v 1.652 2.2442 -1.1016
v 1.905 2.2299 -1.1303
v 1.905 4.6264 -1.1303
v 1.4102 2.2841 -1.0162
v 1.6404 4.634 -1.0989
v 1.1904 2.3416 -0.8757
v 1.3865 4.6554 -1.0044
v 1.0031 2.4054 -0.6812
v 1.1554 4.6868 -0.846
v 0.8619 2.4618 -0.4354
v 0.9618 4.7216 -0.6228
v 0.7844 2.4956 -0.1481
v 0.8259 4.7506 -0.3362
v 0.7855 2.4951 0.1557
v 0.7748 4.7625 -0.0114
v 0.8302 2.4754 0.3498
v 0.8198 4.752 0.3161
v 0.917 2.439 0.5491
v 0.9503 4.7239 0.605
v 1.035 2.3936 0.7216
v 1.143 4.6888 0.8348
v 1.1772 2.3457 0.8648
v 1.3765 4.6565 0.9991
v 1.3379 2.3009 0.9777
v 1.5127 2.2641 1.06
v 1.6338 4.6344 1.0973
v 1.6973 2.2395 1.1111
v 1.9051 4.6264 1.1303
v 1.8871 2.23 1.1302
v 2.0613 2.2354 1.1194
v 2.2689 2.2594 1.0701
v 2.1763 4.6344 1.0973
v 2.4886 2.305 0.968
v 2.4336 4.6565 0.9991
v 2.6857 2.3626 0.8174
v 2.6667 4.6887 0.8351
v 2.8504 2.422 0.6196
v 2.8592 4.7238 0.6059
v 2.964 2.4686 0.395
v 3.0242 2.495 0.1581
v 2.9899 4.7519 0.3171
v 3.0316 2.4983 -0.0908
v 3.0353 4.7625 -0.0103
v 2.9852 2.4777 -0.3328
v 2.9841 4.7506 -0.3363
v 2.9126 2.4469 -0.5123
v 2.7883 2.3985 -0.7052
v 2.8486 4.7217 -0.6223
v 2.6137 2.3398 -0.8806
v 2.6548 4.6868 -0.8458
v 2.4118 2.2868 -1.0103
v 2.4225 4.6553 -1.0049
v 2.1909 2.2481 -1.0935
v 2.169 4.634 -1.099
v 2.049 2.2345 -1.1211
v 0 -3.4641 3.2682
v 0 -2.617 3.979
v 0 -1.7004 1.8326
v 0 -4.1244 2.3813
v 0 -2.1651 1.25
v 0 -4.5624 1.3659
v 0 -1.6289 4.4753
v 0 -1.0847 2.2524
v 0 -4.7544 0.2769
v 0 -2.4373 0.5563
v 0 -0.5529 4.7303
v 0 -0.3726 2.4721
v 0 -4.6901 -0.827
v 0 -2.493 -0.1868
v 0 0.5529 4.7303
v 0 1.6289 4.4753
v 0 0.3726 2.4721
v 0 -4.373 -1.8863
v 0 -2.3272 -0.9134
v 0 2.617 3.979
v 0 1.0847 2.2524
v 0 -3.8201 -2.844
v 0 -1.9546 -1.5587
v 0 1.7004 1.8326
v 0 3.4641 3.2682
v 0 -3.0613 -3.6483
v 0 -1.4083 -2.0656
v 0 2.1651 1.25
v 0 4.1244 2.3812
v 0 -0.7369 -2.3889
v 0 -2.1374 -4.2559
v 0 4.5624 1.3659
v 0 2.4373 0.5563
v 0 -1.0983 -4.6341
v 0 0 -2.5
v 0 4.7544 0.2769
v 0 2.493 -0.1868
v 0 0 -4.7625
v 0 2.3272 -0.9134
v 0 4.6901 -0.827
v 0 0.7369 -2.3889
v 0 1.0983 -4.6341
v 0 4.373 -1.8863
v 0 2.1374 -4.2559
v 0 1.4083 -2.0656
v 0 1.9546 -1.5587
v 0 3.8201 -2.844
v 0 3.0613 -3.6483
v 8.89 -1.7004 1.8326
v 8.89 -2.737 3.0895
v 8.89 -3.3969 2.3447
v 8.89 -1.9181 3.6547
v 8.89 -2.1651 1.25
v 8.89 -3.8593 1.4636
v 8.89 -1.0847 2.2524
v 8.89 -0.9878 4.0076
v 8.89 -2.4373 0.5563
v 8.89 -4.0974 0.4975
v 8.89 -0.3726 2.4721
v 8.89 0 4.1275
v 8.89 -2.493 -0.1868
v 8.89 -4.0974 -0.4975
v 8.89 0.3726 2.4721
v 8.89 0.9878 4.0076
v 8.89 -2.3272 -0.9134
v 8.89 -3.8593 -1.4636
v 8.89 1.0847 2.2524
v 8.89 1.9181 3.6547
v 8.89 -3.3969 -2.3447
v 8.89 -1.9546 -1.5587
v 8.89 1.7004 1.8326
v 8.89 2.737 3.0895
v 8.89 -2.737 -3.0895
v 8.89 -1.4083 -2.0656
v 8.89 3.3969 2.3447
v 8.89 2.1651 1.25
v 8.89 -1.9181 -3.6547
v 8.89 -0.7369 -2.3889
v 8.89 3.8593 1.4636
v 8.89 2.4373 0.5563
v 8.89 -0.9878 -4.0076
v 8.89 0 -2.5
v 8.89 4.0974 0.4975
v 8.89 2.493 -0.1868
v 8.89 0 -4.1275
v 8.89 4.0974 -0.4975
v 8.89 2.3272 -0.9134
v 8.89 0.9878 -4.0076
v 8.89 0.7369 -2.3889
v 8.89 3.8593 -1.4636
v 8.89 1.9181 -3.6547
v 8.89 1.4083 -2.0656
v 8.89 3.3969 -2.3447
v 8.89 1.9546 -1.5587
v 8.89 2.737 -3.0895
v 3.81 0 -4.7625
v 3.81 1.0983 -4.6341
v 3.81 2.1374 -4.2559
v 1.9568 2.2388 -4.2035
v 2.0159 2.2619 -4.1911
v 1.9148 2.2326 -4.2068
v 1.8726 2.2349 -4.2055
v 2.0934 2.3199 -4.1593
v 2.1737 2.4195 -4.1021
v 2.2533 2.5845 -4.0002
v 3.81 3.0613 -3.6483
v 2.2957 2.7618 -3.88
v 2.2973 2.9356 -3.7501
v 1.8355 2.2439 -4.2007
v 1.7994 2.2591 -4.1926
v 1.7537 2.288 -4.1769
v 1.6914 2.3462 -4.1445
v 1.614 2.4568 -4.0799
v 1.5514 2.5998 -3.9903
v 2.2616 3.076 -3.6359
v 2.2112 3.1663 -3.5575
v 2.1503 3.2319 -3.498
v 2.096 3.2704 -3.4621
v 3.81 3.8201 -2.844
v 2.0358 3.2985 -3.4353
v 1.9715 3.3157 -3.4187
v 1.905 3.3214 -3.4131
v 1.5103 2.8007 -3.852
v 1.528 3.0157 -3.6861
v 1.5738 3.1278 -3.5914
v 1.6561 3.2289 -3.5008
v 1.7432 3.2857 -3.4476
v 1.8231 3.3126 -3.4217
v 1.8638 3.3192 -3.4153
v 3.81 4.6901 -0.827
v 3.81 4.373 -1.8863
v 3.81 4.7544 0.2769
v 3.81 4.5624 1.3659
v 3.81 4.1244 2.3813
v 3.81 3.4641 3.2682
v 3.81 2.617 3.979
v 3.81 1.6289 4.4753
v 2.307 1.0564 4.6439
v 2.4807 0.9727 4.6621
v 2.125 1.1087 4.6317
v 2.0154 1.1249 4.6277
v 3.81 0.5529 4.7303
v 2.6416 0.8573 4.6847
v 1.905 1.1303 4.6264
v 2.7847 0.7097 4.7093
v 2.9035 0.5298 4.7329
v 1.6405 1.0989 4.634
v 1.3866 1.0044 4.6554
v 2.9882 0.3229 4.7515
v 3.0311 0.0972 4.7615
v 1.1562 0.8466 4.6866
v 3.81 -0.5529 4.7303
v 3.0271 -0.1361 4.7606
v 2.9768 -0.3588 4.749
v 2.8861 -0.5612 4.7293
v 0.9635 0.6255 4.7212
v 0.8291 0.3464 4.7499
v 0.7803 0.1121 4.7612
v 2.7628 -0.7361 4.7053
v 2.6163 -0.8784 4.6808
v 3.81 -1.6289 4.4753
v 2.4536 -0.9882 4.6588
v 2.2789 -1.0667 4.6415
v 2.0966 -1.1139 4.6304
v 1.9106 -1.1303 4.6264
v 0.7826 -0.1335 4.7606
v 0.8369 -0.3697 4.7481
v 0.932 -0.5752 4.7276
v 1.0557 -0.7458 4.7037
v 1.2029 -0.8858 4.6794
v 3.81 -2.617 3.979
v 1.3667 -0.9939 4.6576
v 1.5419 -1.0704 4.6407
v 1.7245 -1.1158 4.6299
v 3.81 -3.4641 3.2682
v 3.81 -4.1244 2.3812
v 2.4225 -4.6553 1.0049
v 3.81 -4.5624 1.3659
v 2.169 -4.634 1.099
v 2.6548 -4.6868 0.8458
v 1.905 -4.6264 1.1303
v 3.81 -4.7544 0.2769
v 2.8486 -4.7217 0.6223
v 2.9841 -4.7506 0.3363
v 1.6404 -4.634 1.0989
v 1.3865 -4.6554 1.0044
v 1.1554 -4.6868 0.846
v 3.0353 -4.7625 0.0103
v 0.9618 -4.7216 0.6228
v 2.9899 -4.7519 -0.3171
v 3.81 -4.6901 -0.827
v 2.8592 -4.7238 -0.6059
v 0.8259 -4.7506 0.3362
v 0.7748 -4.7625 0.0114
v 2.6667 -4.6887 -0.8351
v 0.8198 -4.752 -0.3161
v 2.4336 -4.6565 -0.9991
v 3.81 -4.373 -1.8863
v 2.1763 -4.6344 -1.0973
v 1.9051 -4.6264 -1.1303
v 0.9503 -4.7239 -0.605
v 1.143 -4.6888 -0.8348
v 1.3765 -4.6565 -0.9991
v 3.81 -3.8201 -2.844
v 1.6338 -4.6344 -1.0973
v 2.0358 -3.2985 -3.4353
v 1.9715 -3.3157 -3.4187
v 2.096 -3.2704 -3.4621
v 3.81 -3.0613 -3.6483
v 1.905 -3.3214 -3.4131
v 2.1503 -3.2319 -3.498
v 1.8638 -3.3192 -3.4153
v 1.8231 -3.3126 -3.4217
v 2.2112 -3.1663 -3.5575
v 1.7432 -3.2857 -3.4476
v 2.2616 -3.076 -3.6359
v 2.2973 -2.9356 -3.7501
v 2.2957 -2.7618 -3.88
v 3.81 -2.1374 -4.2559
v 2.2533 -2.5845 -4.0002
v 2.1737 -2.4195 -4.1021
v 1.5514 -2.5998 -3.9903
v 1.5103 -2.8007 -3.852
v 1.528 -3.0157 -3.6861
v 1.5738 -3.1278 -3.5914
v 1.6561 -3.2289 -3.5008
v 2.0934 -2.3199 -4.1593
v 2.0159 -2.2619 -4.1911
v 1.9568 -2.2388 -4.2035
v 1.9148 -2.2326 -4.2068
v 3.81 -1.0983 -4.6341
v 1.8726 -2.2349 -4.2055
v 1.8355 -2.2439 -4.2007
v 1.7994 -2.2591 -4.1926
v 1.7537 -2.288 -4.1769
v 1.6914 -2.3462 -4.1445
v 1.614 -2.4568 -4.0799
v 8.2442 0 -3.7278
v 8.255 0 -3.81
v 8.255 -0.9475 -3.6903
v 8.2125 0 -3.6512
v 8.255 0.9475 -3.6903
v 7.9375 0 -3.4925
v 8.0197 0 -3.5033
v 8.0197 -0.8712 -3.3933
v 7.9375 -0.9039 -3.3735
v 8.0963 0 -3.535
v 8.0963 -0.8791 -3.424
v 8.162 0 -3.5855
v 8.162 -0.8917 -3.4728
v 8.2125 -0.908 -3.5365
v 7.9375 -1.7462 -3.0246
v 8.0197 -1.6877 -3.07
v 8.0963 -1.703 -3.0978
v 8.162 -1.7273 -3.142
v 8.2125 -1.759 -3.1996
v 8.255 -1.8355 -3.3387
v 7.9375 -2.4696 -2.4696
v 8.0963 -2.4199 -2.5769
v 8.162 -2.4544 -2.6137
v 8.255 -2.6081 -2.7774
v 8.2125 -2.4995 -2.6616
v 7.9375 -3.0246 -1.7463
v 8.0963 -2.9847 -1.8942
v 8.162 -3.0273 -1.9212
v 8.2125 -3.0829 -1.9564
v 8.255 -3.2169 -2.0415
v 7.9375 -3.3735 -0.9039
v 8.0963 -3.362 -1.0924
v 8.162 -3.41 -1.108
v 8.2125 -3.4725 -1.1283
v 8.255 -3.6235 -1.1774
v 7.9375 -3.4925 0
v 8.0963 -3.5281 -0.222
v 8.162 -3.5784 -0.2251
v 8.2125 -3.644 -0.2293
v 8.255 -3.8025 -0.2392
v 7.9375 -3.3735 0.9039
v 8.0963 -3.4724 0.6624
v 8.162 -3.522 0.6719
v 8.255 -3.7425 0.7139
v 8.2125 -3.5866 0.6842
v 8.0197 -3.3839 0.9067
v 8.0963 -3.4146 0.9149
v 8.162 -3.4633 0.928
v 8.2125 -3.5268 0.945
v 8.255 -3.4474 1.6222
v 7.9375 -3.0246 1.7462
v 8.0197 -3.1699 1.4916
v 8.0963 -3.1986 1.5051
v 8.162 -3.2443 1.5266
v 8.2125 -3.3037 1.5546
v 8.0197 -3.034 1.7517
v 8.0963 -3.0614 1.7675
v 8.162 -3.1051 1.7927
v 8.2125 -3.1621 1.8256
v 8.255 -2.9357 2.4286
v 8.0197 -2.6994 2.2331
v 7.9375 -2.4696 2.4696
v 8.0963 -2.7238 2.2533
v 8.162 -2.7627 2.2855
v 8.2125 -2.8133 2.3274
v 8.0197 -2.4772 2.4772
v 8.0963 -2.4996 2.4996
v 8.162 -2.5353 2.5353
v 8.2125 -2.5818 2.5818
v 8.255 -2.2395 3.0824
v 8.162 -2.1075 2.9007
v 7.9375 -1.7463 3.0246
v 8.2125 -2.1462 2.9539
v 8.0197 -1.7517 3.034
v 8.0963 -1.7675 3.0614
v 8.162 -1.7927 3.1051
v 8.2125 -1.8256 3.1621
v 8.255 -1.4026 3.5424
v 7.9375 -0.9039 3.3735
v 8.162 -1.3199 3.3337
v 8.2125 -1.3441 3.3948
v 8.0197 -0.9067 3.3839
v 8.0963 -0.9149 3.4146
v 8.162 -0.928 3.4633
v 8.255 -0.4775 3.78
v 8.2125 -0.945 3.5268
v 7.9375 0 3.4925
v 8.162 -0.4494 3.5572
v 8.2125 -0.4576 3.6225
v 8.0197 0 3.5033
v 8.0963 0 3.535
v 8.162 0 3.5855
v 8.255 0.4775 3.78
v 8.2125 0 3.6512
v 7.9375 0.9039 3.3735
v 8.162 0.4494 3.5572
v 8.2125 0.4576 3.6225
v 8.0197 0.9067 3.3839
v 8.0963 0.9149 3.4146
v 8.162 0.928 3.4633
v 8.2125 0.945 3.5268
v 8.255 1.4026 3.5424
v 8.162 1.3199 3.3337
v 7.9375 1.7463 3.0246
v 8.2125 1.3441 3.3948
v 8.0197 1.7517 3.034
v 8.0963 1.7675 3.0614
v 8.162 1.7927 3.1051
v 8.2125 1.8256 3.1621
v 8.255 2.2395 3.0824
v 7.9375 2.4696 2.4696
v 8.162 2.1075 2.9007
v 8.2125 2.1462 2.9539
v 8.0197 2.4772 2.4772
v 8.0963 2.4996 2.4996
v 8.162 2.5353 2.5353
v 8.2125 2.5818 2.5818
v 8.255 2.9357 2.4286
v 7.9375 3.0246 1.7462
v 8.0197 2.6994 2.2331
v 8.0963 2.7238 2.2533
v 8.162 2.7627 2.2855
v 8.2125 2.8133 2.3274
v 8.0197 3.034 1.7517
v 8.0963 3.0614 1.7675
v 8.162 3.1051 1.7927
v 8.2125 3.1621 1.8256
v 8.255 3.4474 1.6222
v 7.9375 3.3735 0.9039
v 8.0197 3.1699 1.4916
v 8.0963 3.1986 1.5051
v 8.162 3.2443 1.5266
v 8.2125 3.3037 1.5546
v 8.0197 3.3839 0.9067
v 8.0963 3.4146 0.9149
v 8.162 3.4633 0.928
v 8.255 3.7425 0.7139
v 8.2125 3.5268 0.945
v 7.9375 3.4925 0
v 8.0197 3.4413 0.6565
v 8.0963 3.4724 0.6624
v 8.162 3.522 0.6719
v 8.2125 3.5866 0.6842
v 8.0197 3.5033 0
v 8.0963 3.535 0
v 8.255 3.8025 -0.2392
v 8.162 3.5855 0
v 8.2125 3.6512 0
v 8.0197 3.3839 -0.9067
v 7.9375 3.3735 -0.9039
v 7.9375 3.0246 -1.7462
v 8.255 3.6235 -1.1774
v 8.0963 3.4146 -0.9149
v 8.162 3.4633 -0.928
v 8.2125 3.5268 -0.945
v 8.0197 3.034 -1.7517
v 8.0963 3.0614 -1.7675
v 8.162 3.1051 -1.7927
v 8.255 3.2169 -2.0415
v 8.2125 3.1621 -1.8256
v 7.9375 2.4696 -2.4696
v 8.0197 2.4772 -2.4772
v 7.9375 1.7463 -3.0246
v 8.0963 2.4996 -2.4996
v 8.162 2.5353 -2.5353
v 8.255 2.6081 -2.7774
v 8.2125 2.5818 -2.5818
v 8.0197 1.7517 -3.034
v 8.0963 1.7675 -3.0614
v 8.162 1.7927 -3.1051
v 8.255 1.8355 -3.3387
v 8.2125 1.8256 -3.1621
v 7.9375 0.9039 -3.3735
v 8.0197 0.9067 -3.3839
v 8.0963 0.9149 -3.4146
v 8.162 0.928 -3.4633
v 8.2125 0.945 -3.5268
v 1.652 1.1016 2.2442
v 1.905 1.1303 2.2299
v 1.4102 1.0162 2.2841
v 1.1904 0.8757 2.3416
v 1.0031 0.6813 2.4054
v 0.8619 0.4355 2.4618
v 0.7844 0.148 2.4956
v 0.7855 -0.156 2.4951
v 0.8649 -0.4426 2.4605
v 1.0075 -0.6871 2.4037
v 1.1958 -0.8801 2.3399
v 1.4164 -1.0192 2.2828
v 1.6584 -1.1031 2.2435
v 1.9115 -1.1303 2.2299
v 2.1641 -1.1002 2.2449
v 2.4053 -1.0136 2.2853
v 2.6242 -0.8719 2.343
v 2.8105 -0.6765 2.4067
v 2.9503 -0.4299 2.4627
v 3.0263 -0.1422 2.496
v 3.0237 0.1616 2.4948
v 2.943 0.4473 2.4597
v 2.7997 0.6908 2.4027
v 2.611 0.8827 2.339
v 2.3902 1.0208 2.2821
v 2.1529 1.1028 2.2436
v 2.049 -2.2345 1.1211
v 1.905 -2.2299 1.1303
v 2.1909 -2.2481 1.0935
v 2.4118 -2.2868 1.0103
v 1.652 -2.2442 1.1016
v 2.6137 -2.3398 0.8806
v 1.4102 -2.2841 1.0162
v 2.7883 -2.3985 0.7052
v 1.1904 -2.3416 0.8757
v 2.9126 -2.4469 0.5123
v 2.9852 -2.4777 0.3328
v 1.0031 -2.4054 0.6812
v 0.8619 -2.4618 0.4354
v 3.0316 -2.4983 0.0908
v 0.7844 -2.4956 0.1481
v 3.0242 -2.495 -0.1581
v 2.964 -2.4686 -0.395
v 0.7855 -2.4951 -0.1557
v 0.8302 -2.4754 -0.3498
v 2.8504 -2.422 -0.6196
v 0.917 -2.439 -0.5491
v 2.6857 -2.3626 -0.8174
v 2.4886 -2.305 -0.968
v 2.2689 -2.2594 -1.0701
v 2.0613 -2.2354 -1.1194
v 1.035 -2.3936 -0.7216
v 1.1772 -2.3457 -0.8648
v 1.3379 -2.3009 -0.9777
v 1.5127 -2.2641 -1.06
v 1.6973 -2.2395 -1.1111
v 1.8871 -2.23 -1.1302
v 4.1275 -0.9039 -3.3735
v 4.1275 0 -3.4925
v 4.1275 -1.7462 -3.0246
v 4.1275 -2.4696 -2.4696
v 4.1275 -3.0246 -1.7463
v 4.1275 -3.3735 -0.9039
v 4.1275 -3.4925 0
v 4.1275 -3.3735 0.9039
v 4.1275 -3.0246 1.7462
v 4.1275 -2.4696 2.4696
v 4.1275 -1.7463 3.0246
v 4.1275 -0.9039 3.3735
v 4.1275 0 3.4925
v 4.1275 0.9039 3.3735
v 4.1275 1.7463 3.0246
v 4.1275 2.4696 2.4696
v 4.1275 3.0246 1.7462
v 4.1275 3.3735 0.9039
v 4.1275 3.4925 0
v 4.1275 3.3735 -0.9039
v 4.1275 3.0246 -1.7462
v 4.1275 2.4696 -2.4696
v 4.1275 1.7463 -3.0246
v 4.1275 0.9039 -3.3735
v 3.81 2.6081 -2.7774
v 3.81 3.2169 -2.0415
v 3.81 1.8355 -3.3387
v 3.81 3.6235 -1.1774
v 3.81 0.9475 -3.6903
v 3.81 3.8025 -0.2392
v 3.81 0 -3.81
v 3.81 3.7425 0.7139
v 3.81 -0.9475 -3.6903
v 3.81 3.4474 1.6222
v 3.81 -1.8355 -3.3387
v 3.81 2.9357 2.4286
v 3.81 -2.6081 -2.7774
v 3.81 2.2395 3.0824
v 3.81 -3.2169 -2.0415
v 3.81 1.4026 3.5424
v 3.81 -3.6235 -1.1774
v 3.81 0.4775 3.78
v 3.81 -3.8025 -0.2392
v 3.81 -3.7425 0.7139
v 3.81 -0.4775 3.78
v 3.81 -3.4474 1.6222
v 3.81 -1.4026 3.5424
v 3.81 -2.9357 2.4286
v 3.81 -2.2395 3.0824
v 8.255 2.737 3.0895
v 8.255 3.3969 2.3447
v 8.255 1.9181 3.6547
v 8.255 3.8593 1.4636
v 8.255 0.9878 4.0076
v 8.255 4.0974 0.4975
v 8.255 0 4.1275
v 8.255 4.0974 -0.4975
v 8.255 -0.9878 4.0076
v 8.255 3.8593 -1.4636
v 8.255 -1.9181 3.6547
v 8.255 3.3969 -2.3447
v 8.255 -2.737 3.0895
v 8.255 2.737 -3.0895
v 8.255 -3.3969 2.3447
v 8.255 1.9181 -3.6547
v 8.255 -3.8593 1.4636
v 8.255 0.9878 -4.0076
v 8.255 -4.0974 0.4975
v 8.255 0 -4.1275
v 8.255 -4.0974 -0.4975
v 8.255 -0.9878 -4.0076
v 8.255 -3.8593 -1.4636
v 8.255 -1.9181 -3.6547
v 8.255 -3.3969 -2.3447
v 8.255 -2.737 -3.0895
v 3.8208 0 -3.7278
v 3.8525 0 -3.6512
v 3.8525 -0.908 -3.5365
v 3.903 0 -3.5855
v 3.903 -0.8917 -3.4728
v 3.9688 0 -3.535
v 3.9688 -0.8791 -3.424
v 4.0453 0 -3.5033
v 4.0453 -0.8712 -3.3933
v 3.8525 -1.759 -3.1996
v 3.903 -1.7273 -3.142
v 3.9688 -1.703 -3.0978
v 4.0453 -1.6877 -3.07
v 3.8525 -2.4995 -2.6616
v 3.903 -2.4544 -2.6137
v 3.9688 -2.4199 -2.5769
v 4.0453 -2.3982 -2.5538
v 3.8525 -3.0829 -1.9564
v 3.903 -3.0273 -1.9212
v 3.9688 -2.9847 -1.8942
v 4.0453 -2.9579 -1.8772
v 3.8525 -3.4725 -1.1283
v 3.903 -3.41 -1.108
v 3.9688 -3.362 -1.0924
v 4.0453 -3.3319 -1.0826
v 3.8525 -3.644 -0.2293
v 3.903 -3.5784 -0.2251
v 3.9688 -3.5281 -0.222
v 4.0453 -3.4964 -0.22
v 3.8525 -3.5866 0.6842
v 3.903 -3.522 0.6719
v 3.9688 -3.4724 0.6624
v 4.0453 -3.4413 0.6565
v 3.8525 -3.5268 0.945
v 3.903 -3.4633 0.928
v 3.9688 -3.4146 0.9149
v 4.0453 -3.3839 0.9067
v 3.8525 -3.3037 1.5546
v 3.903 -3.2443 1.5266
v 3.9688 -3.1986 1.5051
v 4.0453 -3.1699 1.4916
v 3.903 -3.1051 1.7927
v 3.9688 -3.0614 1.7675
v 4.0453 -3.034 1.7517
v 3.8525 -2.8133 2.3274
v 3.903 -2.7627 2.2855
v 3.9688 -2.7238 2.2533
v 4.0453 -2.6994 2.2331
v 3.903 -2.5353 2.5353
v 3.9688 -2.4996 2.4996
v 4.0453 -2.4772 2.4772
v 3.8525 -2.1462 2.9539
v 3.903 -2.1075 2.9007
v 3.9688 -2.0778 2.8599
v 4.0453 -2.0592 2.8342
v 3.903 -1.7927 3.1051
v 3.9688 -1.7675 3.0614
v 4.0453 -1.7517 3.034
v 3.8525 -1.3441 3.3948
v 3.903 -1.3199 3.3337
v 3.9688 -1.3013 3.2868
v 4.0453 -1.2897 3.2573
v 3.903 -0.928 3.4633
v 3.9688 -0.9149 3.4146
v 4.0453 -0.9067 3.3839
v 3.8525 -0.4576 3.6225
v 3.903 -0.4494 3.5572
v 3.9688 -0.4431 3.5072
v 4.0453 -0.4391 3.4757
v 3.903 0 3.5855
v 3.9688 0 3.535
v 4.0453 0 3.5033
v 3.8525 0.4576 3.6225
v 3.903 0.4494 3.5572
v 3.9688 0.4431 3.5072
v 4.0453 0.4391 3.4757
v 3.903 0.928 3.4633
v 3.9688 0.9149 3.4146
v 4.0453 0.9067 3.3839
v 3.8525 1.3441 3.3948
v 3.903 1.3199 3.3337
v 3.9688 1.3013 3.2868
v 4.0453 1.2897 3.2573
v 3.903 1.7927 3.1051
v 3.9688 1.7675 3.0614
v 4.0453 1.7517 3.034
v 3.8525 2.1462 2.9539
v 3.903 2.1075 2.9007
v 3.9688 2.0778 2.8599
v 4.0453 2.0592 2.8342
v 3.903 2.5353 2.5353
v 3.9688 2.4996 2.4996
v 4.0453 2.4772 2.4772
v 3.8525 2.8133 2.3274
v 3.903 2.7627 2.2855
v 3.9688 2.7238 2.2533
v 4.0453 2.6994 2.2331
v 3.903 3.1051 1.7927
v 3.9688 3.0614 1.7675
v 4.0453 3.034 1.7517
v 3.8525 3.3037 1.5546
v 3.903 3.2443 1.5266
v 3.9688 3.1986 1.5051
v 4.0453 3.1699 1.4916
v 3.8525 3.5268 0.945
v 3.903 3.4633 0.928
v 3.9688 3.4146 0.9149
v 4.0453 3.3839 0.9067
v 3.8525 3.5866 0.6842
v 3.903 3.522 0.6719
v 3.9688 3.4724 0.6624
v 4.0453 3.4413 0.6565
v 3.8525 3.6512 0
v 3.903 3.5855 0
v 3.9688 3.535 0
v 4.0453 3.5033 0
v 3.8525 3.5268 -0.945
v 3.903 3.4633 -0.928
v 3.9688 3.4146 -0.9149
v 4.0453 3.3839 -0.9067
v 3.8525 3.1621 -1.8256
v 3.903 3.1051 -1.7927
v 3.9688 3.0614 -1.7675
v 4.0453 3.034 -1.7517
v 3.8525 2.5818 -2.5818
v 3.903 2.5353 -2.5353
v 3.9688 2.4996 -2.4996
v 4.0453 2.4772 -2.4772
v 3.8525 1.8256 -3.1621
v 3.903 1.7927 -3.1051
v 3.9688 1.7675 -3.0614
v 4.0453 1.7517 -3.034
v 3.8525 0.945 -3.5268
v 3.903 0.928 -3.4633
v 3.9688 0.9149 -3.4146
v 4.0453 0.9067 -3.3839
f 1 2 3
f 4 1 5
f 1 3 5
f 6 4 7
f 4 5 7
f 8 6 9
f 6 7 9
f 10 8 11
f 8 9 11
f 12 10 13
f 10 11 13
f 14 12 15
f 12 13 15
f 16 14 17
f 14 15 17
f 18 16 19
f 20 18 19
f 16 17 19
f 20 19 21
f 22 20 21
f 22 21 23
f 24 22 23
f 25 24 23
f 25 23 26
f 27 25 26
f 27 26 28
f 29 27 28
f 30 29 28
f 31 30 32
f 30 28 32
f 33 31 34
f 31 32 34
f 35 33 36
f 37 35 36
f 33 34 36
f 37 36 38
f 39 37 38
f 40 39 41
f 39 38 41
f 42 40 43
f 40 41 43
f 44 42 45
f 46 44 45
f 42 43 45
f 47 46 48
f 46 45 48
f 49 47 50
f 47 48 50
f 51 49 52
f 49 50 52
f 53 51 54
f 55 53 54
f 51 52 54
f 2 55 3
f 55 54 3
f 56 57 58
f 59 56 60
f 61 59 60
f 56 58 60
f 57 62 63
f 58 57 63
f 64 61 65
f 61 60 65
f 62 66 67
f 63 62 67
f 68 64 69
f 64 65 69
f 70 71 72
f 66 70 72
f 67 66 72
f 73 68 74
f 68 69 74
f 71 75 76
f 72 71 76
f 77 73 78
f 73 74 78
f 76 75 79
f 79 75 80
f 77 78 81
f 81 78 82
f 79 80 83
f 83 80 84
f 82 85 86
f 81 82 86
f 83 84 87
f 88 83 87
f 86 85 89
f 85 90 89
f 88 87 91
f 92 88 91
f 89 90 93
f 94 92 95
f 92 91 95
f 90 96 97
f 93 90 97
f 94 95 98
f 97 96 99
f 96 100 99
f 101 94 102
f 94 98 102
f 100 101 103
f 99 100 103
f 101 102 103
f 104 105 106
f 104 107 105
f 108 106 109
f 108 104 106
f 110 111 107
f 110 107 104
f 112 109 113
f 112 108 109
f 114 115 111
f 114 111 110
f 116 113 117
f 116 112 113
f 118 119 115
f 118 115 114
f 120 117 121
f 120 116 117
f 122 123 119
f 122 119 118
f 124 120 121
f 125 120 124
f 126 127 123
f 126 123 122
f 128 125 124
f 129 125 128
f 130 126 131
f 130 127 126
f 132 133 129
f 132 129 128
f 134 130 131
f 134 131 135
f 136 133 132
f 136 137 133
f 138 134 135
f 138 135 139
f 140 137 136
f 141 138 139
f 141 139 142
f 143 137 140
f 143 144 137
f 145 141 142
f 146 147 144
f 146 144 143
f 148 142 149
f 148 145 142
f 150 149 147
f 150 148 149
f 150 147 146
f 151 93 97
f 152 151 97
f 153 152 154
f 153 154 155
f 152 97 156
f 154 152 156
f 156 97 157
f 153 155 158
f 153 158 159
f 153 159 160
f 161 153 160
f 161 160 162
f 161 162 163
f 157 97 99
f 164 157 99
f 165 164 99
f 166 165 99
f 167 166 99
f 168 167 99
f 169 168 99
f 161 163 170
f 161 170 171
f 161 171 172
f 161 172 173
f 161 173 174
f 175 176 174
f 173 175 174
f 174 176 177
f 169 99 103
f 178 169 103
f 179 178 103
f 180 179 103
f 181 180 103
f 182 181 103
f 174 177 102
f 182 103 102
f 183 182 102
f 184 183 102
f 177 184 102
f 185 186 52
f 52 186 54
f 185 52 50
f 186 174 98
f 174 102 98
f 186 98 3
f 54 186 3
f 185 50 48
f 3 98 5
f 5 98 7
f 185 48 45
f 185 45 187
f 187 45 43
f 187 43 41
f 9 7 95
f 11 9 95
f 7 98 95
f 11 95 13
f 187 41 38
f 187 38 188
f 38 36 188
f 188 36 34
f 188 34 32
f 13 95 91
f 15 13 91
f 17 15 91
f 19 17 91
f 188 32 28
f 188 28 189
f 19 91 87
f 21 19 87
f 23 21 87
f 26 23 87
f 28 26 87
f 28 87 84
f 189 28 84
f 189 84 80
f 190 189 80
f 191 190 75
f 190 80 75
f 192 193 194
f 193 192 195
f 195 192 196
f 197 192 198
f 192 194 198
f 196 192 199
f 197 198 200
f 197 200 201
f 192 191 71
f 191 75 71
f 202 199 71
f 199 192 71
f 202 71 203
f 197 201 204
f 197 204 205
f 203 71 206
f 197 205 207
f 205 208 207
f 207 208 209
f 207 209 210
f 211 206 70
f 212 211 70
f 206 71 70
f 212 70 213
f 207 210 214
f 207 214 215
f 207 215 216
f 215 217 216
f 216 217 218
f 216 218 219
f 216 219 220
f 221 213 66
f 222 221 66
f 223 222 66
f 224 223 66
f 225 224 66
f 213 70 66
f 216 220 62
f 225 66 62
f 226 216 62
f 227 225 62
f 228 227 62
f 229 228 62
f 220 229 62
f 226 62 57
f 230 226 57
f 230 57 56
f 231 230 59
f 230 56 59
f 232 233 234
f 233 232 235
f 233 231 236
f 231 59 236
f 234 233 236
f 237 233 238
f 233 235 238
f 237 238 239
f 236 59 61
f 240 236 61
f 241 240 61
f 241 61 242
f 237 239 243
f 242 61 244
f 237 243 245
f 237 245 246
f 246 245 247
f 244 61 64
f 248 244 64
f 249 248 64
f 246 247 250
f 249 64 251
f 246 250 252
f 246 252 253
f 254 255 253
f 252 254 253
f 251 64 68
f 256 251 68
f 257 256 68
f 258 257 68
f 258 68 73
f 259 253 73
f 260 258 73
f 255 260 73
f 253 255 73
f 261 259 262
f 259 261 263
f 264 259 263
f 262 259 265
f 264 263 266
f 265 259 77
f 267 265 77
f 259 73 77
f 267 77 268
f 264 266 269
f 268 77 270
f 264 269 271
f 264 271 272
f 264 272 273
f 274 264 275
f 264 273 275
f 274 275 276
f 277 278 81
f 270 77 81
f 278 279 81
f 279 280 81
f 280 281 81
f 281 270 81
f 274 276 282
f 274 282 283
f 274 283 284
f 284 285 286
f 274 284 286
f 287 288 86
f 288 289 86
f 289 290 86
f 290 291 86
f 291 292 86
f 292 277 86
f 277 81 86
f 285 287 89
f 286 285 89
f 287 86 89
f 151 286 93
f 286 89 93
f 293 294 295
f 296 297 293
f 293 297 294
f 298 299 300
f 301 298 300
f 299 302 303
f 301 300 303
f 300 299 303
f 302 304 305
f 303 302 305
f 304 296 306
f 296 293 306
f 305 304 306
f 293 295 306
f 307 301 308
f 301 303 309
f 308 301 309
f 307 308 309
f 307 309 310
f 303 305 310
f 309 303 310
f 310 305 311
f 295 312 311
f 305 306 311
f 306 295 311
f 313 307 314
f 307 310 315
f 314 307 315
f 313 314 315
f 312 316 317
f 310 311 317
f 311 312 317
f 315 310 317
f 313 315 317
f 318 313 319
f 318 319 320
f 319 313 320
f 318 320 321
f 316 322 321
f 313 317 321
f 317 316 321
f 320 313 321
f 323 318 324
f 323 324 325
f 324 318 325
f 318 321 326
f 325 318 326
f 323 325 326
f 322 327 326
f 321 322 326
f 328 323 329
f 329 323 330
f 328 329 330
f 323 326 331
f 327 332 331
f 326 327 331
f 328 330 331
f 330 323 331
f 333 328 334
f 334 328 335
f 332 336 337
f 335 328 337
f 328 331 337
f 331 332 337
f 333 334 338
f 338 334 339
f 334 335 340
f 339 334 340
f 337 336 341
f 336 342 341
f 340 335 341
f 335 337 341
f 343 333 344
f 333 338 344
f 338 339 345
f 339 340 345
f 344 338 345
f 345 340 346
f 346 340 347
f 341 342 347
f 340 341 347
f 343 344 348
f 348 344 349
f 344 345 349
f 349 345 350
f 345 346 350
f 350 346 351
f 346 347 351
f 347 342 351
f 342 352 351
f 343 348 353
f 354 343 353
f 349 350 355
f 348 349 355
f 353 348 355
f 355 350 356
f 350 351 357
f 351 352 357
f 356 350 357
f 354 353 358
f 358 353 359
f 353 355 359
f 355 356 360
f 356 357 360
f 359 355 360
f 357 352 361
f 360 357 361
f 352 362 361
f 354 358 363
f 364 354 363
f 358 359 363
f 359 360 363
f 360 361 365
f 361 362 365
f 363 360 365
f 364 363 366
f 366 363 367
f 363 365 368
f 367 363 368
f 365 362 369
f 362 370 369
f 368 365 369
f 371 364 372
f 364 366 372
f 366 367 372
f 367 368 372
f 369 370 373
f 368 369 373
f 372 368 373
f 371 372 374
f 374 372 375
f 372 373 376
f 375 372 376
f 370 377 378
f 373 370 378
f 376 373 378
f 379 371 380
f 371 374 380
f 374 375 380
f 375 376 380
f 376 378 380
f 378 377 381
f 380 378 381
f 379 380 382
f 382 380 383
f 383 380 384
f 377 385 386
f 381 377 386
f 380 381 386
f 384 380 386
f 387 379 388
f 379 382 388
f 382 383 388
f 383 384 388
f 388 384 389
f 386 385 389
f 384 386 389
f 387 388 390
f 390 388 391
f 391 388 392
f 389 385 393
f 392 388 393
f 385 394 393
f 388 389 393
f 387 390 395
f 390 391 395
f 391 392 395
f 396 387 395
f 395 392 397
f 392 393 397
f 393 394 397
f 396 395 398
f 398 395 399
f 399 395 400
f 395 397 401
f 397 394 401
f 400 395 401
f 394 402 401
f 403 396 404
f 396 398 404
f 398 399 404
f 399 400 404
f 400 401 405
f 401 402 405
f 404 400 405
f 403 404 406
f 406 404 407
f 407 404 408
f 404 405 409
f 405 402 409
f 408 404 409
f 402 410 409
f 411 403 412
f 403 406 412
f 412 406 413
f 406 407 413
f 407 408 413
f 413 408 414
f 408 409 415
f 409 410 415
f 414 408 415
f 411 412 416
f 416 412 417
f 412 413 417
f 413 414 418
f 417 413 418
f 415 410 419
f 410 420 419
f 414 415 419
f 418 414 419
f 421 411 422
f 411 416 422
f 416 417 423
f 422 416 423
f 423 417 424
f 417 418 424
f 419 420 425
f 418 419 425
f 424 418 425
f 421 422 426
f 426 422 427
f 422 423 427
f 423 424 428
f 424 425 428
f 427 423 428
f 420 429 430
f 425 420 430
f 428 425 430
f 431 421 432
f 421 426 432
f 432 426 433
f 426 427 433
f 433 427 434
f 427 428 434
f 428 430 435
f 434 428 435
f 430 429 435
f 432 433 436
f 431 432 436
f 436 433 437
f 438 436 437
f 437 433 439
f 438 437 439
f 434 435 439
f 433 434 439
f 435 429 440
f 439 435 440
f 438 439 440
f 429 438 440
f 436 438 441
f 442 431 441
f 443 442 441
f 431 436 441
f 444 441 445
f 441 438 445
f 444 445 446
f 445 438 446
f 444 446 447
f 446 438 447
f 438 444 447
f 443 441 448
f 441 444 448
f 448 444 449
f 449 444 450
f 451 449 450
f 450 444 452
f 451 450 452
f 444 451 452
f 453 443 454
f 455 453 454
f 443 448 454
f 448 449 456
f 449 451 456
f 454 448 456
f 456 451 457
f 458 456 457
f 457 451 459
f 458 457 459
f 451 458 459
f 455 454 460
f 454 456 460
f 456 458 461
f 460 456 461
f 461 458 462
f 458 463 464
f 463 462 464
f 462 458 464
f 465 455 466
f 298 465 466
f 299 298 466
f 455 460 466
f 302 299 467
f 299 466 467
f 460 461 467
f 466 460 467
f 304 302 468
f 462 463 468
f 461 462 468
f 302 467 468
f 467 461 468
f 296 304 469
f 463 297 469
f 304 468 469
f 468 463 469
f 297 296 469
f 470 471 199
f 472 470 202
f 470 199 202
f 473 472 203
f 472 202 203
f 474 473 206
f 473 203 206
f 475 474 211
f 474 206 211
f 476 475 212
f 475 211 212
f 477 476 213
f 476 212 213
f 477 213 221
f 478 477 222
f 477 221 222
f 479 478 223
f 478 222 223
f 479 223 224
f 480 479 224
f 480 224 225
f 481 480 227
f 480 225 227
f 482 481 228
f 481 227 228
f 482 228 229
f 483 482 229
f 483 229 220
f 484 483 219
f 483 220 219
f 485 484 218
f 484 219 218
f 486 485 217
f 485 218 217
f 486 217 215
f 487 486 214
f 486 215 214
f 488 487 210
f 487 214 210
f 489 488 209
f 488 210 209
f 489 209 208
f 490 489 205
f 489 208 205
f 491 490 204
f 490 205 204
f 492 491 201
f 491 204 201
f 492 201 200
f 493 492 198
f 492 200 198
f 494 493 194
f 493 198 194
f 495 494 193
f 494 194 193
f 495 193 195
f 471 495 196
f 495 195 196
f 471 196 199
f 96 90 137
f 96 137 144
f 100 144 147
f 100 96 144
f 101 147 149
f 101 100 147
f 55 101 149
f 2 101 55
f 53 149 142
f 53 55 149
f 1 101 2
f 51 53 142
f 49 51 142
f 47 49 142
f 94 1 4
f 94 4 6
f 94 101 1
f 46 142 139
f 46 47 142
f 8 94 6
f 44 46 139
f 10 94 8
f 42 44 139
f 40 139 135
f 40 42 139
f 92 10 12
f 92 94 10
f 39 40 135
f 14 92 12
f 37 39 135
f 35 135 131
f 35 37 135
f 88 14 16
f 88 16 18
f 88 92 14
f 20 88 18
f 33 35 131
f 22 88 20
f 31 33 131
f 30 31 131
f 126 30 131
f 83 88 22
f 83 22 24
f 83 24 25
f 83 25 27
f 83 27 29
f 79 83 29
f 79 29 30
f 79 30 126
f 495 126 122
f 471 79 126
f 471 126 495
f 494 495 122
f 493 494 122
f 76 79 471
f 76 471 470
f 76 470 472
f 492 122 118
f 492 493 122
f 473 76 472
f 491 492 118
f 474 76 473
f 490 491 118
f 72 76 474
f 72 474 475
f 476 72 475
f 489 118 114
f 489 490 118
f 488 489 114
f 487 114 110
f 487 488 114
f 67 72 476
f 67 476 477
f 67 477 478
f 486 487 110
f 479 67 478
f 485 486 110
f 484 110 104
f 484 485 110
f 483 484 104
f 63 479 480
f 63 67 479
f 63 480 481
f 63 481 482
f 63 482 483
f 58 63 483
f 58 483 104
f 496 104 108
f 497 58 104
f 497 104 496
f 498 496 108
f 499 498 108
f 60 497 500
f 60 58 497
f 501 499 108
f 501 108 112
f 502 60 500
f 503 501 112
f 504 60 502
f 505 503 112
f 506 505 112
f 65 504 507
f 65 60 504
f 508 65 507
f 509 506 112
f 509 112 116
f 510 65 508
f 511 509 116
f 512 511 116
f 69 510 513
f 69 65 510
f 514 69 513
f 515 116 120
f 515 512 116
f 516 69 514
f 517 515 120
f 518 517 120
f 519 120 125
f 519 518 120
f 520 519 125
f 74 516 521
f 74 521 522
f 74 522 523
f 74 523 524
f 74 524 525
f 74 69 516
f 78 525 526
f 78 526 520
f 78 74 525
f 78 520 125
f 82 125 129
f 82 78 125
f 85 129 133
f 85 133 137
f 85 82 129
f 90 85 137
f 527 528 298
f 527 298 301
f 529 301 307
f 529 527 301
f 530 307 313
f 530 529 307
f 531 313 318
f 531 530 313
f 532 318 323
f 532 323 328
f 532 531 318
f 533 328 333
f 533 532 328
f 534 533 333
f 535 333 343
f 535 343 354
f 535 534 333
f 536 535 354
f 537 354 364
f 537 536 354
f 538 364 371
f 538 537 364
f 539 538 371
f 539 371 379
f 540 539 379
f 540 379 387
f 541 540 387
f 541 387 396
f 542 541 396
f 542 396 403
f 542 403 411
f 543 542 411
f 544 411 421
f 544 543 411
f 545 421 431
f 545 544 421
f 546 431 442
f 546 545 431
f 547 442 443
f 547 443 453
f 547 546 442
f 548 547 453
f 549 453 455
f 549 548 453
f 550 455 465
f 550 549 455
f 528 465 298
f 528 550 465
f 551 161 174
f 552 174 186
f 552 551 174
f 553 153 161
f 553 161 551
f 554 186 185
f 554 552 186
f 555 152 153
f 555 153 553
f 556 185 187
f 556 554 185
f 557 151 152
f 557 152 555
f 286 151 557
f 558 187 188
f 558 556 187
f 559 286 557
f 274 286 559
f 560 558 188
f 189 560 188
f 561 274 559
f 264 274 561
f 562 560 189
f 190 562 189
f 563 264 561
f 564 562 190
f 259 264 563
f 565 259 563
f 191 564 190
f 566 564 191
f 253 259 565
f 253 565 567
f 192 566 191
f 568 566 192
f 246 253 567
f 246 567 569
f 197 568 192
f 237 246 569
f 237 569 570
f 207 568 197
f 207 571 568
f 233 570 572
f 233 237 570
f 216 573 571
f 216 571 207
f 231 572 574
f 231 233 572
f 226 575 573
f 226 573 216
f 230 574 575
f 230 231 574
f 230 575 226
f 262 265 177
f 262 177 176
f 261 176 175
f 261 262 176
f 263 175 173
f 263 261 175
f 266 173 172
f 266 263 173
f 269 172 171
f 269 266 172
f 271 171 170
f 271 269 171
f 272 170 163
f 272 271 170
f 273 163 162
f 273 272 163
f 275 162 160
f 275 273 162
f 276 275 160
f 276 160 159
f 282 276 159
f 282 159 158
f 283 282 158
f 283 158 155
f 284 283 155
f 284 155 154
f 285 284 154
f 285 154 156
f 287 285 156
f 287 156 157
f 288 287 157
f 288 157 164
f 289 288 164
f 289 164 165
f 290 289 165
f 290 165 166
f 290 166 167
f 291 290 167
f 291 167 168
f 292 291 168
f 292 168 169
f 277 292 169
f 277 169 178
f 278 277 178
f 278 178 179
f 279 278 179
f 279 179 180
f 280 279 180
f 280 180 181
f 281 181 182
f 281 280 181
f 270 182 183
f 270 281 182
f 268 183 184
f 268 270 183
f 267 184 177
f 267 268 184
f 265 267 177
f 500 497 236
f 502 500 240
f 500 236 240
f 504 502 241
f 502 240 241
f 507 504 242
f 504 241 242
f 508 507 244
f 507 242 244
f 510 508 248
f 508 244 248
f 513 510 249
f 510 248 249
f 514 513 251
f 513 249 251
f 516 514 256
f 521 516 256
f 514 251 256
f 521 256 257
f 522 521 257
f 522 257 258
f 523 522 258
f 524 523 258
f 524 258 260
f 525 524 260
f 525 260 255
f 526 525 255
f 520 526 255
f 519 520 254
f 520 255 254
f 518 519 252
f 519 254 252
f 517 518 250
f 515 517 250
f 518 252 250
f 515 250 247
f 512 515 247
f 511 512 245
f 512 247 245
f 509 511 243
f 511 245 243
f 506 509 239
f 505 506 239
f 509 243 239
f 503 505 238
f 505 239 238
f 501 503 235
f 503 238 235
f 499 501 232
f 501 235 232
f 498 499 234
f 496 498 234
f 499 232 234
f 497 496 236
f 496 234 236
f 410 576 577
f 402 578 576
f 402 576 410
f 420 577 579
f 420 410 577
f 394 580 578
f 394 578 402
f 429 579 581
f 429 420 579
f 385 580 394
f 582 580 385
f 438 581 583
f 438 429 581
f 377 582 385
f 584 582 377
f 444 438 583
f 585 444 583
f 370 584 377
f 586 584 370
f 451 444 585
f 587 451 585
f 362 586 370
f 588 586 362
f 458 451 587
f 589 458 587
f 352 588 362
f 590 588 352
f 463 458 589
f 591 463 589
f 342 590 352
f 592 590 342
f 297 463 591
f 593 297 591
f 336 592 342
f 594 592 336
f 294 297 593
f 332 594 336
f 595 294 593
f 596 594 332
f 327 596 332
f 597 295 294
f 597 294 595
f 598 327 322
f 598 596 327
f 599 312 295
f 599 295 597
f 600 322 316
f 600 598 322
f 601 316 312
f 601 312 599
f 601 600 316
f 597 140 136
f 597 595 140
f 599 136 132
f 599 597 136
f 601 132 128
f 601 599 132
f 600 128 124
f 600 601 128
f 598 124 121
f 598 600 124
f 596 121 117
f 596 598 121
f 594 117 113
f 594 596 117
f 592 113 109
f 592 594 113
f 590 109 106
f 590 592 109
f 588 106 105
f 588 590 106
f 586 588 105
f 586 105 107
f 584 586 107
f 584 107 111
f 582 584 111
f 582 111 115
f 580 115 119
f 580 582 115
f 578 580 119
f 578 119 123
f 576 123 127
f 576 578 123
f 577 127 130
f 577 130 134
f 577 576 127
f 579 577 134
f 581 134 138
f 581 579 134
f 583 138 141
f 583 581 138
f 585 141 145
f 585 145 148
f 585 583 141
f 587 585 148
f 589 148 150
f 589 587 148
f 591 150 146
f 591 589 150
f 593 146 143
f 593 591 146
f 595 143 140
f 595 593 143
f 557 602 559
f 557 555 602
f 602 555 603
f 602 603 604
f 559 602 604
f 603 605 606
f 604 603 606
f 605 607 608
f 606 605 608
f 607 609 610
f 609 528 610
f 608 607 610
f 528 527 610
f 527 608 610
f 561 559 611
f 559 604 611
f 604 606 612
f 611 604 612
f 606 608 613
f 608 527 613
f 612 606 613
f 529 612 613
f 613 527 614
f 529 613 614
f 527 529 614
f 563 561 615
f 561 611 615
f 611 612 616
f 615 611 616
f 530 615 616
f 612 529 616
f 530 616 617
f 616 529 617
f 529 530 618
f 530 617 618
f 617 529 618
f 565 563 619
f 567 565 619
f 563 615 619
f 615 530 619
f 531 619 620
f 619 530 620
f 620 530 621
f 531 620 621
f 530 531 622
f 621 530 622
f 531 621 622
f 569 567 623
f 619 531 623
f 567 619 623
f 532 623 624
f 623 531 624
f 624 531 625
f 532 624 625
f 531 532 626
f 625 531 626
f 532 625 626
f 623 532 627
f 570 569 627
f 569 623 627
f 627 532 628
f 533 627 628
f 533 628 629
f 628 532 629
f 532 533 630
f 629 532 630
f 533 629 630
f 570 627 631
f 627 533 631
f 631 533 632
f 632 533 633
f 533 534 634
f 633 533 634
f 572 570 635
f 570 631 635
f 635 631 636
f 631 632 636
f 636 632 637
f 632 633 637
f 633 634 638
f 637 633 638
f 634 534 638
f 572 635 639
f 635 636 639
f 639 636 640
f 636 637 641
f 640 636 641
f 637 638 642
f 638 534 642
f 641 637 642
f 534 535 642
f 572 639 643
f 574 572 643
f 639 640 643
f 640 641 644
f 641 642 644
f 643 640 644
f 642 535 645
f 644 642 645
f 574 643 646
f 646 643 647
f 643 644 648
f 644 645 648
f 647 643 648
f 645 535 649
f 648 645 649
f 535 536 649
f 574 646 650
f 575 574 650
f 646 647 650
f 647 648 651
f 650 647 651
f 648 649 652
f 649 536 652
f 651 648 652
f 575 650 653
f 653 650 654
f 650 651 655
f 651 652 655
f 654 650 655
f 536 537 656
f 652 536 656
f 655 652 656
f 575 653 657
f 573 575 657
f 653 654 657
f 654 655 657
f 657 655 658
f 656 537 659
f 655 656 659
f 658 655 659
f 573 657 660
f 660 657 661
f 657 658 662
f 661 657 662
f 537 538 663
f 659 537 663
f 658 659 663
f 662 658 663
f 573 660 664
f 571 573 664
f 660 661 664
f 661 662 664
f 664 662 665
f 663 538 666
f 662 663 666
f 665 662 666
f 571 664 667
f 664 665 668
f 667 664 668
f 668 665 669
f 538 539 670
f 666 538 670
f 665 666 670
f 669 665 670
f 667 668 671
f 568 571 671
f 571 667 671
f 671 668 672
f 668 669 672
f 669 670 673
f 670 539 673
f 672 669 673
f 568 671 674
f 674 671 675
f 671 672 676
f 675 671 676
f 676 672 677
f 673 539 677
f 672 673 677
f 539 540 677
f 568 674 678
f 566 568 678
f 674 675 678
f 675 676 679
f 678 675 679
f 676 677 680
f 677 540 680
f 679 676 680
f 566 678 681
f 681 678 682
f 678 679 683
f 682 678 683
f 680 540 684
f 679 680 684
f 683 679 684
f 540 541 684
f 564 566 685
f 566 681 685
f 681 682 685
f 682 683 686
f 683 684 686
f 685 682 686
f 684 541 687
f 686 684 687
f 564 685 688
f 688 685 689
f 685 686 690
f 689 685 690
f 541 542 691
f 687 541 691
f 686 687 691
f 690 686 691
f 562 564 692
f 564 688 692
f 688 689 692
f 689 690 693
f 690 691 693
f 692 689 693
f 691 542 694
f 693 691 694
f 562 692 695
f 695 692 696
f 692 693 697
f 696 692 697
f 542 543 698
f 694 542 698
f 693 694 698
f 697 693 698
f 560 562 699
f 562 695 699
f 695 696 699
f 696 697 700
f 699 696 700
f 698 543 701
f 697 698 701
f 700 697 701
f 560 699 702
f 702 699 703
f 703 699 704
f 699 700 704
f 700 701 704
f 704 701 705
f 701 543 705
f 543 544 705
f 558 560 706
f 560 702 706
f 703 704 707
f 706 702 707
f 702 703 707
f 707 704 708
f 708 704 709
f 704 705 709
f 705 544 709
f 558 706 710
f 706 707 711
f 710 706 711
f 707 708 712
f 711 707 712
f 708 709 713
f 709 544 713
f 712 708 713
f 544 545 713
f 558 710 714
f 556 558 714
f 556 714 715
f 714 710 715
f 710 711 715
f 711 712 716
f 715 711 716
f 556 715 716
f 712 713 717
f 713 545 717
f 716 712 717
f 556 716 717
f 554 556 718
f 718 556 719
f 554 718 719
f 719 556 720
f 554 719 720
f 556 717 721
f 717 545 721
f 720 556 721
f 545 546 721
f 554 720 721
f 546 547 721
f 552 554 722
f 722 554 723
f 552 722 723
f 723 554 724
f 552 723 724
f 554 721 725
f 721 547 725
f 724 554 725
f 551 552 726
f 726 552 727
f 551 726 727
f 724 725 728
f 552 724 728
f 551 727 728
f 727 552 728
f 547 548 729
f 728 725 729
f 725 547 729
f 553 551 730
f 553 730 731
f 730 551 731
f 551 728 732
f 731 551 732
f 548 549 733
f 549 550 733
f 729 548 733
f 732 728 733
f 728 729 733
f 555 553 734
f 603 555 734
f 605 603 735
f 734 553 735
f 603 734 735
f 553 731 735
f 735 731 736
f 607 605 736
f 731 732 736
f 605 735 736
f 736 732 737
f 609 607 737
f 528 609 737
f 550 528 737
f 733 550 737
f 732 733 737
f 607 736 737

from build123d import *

# Parameters (mm, degrees)
SKETCH1_R            = 4.7625
SKETCH1_R_2          = 2.499995
BASE_DEPTH           = 8.89
CRIMPHOLE_DEPTH      = 12.153246725
CRIMPHOLE_DEPTH_BACK = 12.153246725
SKETCH7_R            = 0.396875
SKETCH3_W            = 1.1303
SKETCH3_H            = 4.7635
CUTTERRAD_R          = 0.3175
CIRPATTERN1_COUNT    = 4


with BuildPart() as part:
    # Sketch1 → Base (new body)
    with BuildSketch(Plane(origin=(0, 0, 0), x_dir=(0, 0, -1), z_dir=(1, 0, 0))):
        Circle(SKETCH1_R)
        Circle(SKETCH1_R_2, mode=Mode.SUBTRACT)
    extrude(amount=BASE_DEPTH)

    # Sketch2 → Spool (revolve, cut)
    with BuildSketch(Plane.XY, mode=Mode.PRIVATE) as spool_sk:
        Polygon((3.81, 4.7625), (8.89, 4.7625), (8.89, 4.1275), (8.255, 4.1275), (8.255, 3.4925), (3.81, 3.4925), align=None)
    revolve(spool_sk.sketch.rotate(Axis((8.89, 0, 0), (-1, 0, 0)), 90), axis=Axis((8.89, 0, 0), (-1, 0, 0)), mode=Mode.SUBTRACT)

    # Sketch7 → CrimpHole (cut, two sides: drawn at the far end of the back side and taken through both)
    with BuildSketch(Plane(origin=(0, 0, 0), x_dir=(1, 0, 0), z_dir=(0, 1, 0)).offset(-CRIMPHOLE_DEPTH_BACK)):
        with Locations(Location((1.905, 3.81, 0), (0, 0, 270))):
            Circle(SKETCH7_R)
    extrude(amount=CRIMPHOLE_DEPTH + CRIMPHOLE_DEPTH_BACK, mode=Mode.SUBTRACT)

    # Sketch3 → ShaftSetScrew (revolve, cut)
    with BuildSketch(Plane.YZ.offset(1.905)):
        with Locations((0.56515, 2.38175)):
            Rectangle(SKETCH3_W, SKETCH3_H)
    shaftsetscrew = revolve(axis=Axis((1.905, 0, -6.35), (0, 0, 1)), mode=Mode.SUBTRACT)

    # CutterRad
    cutterrad_edges = [part.edges().sort_by_distance(p)[0] for p in [
        (3.81, 0, 3.4925),
        (8.255, 0, 3.4925),
    ]]
    fillet(cutterrad_edges, radius=CUTTERRAD_R)

    # CirPattern1: ShaftSetScrew ×4 about axis, 1 skipped
    cirpattern1_axis = Axis((8.89, 0, 0), (-1, 0, 0))
    add([shaftsetscrew.rotate(cirpattern1_axis, i * 360 / CIRPATTERN1_COUNT) for i in range(1, CIRPATTERN1_COUNT) if i not in (2,)], mode=Mode.SUBTRACT)


solid = part.part
